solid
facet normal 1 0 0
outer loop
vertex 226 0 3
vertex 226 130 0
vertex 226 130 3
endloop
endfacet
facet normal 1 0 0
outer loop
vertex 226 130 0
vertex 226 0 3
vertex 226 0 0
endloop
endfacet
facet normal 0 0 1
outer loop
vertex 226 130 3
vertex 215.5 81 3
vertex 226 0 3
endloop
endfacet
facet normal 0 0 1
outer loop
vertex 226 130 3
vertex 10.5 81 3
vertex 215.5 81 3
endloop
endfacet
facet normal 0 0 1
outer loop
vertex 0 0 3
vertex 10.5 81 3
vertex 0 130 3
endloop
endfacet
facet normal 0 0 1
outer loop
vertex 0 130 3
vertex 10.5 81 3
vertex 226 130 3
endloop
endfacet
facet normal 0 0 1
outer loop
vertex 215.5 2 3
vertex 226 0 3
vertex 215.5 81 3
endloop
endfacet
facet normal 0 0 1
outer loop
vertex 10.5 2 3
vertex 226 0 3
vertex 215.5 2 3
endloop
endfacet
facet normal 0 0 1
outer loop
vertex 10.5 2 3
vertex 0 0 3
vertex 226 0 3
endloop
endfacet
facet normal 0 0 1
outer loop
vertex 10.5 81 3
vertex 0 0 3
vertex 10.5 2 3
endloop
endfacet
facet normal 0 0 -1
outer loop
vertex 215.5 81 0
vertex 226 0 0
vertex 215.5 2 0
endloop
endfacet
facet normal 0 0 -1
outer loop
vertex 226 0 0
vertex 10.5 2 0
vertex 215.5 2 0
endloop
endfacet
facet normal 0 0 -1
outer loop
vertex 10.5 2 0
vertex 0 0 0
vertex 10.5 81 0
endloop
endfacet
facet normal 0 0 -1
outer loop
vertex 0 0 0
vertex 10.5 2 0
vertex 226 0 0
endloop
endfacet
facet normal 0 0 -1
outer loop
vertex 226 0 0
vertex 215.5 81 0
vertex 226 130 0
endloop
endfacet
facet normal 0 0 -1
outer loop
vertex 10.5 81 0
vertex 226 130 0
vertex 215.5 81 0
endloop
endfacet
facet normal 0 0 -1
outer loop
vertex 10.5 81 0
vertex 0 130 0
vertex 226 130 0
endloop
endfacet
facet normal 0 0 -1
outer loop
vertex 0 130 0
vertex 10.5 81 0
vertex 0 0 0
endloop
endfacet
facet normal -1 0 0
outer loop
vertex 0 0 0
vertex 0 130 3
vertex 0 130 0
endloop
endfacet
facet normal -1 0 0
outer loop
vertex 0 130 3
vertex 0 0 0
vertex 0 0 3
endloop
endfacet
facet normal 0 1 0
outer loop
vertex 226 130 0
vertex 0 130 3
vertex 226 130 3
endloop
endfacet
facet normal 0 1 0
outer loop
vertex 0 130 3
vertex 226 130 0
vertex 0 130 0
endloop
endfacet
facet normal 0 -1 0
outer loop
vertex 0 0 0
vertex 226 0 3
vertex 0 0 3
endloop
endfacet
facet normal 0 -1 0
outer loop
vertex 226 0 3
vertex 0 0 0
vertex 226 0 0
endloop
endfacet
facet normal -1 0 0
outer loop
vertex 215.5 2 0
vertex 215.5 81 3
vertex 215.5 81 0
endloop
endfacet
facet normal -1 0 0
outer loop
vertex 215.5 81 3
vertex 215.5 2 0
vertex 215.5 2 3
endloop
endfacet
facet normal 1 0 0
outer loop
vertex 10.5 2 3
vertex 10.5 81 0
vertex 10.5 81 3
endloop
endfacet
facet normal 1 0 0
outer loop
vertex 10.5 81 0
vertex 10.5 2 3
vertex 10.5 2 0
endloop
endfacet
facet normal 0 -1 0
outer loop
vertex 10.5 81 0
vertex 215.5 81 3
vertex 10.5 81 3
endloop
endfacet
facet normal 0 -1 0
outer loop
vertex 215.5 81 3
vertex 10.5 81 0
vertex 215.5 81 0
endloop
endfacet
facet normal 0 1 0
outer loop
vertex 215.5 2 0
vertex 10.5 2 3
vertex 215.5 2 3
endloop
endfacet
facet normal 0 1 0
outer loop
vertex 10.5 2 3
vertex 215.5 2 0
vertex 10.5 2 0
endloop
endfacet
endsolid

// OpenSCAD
// Piputer — keyboard cover plate (Tastaturabdeckung)
// Sits on top of bottom shell at Z=H (=35), closes the open top.
// Keyboard cutout exposes the MC-8017 key area.
//
// Coordinate convention: matches bottom.scad (X=0..W, Y=0..D, Z=0..t)
// Place in assembly: translate([0, 0, 35]) kb_cover();

eps = 0.01;

module kb_cover(
    W     = 226,   // matches bottom shell width
    D     = 130,   // covers keyboard area only (lid footprint)
    t     = 3,     // cover thickness
    wall  = 2,     // inner wall thickness (matches bottom.scad)

    // Keyboard cutout: 205 mm (X) × 79 mm (Y)
    // Centred in X, flush with front inner wall in Y
    cut_w = 205,
    cut_d = 79
) {
    cut_x = (W - cut_w) / 2;   // = 10.5 mm → centred
    cut_y = wall;               // flush with inner front wall

    difference() {
        cube([W, D, t]);

        // Keyboard cutout
        translate([cut_x, cut_y, -eps])
            cube([cut_w, cut_d, t + 2*eps]);
    }
}

kb_cover();
